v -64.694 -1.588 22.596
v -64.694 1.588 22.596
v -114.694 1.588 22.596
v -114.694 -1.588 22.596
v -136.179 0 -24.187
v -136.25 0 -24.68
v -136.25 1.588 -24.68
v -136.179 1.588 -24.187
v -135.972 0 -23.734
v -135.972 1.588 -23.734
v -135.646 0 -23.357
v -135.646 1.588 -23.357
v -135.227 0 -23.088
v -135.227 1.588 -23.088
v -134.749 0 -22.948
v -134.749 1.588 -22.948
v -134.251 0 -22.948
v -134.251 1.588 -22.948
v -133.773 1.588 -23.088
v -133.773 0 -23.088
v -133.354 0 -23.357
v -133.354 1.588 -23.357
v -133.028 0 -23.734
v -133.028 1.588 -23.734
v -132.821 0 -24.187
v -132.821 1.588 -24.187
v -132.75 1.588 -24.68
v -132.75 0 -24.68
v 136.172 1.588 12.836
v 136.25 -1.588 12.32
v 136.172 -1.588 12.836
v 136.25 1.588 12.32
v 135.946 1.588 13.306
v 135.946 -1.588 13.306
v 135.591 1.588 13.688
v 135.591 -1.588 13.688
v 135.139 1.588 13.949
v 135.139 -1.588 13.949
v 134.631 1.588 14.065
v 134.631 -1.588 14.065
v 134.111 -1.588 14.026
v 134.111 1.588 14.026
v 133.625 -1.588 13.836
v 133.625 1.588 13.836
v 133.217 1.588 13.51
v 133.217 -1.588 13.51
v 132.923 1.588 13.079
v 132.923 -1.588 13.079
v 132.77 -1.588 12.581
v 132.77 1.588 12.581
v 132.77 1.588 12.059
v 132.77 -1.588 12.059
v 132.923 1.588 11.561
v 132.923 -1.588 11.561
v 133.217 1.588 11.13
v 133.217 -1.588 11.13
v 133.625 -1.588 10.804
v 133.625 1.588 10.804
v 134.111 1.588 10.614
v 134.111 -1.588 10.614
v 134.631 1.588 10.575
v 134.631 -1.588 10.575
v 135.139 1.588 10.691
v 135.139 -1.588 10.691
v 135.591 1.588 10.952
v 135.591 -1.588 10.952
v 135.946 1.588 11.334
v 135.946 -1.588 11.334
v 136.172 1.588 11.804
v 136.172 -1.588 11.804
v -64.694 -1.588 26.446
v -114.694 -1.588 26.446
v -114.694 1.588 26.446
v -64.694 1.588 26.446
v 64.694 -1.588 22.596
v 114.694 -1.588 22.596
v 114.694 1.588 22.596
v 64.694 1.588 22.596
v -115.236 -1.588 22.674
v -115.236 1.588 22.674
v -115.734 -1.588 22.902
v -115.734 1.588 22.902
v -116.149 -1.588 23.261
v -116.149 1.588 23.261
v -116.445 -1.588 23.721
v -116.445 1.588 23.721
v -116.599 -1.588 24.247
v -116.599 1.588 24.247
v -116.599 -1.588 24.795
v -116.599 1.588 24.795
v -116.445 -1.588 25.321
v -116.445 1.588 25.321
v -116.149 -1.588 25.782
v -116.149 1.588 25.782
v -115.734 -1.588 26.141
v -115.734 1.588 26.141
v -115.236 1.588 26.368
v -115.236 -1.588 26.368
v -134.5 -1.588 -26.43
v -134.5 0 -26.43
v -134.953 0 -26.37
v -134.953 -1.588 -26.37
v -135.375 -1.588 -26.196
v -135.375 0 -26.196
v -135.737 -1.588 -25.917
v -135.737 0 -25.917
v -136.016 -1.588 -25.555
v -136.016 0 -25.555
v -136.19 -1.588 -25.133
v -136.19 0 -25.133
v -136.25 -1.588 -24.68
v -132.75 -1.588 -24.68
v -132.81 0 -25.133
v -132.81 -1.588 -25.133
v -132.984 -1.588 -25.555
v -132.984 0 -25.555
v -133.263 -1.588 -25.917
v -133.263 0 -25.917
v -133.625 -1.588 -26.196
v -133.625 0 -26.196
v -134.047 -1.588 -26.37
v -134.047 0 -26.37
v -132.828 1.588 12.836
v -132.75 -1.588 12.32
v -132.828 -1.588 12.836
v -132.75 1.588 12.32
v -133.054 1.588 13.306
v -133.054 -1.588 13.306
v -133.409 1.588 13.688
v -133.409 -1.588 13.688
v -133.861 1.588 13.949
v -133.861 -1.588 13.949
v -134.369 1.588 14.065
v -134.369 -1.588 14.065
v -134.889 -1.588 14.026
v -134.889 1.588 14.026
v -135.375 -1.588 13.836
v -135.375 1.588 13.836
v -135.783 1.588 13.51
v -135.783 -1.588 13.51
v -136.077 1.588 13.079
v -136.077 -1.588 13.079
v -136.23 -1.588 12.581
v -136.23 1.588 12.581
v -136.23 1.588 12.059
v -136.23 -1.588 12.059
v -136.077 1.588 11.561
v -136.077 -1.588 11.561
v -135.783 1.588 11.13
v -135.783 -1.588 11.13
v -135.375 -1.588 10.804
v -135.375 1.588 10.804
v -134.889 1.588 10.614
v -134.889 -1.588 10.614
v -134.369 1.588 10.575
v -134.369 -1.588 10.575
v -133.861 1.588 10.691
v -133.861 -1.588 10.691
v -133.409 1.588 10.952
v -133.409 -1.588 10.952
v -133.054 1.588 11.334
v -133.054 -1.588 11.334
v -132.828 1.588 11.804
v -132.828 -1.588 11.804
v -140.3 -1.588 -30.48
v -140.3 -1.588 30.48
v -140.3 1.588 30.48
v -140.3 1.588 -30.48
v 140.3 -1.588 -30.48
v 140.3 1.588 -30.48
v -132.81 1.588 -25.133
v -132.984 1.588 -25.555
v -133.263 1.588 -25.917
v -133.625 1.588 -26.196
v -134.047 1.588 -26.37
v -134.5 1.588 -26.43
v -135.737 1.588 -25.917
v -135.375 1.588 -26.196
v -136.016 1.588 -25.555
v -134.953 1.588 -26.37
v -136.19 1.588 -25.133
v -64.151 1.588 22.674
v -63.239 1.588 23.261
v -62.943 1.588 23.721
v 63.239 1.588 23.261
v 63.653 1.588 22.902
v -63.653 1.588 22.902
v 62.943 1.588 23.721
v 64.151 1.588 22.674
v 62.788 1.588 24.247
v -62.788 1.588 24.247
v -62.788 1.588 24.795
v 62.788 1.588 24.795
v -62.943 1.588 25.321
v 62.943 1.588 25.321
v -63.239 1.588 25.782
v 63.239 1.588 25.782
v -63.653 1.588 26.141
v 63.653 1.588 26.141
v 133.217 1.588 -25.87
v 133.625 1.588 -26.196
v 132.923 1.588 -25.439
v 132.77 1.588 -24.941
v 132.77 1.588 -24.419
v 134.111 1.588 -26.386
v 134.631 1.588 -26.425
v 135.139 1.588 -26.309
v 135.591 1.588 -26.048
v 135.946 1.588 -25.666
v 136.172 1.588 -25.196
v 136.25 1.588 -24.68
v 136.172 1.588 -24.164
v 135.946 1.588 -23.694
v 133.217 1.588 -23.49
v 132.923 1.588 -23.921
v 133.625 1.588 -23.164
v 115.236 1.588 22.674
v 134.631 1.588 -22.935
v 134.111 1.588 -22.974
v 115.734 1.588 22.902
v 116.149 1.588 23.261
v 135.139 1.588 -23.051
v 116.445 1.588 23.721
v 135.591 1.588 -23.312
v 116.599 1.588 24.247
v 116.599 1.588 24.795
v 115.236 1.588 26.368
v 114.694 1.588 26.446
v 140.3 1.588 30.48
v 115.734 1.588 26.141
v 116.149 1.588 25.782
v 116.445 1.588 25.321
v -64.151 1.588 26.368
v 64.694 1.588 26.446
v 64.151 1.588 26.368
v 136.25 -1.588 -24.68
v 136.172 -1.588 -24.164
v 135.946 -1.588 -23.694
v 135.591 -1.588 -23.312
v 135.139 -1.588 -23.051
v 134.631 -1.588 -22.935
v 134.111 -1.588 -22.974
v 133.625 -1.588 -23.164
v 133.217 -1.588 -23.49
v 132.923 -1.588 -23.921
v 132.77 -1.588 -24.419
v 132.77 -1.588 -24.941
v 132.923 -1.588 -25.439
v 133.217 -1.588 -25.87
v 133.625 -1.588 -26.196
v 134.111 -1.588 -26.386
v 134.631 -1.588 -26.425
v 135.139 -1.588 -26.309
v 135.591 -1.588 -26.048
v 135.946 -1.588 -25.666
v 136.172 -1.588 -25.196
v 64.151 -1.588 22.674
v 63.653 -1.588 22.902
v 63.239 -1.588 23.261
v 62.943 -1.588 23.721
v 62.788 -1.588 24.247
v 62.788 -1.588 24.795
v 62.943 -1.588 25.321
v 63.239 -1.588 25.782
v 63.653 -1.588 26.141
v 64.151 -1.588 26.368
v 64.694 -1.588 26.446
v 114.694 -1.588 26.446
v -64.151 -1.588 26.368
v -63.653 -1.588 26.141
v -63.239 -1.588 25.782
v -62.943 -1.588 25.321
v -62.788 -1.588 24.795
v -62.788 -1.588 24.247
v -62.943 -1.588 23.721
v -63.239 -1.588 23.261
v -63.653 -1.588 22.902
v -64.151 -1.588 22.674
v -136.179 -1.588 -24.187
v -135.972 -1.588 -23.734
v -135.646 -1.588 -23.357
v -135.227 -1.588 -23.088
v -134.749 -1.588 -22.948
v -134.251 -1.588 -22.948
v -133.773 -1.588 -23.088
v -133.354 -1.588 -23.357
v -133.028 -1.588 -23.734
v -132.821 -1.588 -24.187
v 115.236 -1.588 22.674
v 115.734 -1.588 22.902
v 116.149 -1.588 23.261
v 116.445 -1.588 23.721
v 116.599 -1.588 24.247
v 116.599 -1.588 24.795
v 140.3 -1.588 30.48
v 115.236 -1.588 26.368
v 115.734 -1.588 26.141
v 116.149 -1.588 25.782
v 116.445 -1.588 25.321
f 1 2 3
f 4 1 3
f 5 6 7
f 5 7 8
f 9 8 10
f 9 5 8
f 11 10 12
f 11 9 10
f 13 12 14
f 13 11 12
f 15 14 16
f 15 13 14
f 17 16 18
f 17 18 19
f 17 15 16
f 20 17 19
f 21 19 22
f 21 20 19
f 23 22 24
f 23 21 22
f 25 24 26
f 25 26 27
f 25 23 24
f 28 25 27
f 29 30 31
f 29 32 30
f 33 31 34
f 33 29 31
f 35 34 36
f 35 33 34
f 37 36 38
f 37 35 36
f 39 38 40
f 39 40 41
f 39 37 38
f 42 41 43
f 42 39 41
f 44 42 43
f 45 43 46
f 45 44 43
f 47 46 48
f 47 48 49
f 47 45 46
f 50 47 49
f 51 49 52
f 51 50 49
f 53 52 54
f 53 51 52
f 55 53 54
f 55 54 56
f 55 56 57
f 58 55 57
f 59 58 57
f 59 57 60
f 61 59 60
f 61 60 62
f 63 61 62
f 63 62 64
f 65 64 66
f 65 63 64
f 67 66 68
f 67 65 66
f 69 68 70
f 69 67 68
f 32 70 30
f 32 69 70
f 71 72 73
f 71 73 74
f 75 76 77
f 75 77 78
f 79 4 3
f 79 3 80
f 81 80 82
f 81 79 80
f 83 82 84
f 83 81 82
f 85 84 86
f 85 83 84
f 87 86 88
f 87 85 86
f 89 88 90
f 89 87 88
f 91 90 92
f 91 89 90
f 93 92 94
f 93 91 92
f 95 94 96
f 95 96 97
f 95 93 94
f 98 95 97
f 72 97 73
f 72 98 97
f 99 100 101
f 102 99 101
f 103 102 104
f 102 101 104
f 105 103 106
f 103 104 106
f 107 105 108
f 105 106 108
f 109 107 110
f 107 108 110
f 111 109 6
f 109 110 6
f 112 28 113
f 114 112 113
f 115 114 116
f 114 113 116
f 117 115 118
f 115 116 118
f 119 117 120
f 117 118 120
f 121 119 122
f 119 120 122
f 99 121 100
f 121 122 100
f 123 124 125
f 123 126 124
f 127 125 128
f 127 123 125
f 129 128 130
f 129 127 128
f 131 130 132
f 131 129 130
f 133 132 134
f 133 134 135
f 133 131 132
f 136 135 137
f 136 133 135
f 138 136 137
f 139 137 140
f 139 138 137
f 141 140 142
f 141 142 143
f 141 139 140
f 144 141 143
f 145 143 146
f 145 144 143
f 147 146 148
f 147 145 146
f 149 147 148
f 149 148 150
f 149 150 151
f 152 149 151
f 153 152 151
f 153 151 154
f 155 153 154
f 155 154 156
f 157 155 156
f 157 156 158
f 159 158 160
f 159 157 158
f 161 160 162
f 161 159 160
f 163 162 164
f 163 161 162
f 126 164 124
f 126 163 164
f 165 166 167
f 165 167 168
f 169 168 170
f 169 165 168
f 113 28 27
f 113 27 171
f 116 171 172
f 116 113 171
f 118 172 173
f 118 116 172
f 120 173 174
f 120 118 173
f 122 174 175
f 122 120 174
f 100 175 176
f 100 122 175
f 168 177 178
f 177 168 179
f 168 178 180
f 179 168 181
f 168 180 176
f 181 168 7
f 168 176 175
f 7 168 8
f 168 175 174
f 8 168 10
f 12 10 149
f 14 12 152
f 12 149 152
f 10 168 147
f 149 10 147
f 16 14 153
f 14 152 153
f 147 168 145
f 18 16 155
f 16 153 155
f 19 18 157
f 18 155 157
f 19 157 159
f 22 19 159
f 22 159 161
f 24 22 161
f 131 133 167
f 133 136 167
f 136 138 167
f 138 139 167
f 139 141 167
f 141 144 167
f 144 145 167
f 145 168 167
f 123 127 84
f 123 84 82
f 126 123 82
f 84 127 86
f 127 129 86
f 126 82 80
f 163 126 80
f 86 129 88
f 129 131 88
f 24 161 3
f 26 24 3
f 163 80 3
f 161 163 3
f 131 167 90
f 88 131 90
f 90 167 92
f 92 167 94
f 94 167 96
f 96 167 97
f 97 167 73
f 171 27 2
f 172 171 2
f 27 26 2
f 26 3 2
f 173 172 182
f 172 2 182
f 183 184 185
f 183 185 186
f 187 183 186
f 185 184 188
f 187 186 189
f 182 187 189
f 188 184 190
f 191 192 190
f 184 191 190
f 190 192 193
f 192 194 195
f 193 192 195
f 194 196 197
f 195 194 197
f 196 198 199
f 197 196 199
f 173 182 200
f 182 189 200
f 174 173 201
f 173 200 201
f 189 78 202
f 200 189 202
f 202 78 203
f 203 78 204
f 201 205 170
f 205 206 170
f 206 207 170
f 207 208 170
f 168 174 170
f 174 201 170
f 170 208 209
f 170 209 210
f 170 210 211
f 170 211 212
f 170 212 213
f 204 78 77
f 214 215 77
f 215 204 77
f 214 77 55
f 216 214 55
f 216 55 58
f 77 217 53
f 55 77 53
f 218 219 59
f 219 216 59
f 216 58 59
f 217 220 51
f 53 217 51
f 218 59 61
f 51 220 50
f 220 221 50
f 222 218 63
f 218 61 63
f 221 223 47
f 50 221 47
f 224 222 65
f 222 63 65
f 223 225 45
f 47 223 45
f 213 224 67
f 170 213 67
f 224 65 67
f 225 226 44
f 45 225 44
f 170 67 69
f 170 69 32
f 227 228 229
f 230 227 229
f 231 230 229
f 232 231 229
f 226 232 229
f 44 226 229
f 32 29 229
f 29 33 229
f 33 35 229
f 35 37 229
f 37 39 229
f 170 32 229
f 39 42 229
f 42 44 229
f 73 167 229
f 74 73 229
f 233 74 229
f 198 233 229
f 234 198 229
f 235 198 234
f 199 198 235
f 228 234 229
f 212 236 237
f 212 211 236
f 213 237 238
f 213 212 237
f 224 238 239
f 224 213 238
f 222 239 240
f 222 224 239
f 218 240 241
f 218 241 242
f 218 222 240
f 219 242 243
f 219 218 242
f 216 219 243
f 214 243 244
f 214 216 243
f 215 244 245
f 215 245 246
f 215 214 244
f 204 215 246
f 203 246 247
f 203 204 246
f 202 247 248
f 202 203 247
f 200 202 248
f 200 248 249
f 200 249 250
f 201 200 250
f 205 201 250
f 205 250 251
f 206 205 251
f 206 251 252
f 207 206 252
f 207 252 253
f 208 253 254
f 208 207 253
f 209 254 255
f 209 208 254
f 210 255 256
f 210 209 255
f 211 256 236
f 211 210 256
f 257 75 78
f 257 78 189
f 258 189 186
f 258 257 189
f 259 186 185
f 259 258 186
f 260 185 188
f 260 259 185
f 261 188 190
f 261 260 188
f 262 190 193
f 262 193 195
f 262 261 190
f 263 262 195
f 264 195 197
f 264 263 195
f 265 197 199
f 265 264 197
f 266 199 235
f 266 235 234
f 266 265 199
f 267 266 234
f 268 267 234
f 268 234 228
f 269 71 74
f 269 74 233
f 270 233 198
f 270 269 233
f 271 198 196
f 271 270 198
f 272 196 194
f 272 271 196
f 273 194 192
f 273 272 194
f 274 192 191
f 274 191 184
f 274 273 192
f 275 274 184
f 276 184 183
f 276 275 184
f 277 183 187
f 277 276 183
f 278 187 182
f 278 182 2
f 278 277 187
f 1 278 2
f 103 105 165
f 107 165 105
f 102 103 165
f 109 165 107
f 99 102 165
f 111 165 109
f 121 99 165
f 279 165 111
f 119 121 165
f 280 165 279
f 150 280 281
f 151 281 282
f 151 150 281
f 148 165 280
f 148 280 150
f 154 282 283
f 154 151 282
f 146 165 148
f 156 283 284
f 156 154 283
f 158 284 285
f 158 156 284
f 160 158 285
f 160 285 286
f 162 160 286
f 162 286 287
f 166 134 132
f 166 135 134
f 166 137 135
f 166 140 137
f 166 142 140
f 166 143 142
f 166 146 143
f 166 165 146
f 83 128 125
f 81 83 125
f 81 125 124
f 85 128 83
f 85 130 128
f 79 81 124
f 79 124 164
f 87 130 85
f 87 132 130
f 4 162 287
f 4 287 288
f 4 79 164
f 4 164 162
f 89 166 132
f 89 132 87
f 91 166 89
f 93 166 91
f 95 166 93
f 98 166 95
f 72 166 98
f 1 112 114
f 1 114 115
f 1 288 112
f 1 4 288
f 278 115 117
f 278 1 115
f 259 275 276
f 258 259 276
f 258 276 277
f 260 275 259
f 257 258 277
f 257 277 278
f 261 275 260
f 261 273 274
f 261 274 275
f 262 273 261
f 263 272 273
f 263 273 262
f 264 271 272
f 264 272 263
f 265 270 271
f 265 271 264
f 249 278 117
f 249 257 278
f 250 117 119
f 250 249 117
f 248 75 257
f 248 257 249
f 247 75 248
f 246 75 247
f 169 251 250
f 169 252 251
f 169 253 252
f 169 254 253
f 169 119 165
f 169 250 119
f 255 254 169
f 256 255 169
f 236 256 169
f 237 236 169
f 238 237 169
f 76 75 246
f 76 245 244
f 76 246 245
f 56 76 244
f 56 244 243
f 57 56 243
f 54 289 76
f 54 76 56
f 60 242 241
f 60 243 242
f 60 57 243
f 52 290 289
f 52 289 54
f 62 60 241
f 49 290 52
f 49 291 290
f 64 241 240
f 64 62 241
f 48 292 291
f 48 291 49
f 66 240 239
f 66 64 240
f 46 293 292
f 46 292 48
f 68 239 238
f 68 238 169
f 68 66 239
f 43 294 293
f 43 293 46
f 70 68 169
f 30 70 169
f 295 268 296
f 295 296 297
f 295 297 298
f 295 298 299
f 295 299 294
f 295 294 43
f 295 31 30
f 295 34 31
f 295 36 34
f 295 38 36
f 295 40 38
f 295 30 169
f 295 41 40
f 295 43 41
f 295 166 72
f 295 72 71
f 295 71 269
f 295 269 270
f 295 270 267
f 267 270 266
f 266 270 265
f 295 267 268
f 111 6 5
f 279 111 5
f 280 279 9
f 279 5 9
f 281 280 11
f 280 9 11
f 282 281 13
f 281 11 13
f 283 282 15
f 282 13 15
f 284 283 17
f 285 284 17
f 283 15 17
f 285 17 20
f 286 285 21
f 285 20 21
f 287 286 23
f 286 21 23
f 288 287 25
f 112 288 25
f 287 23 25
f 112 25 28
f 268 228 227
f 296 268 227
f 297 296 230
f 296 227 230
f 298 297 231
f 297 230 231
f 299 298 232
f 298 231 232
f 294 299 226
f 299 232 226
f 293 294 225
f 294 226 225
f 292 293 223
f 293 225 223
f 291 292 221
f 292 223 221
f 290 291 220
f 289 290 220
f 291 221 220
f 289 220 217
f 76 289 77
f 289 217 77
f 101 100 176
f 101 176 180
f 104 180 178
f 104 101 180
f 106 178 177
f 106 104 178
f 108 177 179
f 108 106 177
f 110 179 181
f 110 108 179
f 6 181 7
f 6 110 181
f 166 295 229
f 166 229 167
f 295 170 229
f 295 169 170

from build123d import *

# Parameters (mm, degrees)
F0_R     = 1.75
F1_DEPTH = 1.5875


with BuildPart() as f1:
    # F0 (on Front) → F1 (new body, symmetric)
    with BuildSketch(Plane.XZ):
        with BuildLine():
            Line((140.3, -30.48), (140.3, 30.48))
            Line((140.3, 30.48), (-140.3, 30.48))
            Line((-140.3, 30.48), (-140.3, -24.68))
            Line((-140.3, -24.68), (-136.25, -24.68))
            ThreePointArc((-136.25, -24.68), (-134.5, -22.93), (-132.75, -24.68))
            ThreePointArc((-132.75, -24.68), (-133.2625631329, -25.9174368671), (-134.5, -26.43))
            Line((-134.5, -26.43), (-134.5, -30.48))
            Line((-134.5, -30.48), (140.3, -30.48))
        make_face()
        with Locations((134.5, -24.68)):
            Circle(F0_R, mode=Mode.SUBTRACT)
        with Locations((-134.5, 12.32)):
            Circle(F0_R, mode=Mode.SUBTRACT)
        with BuildLine():
            Line((-114.69375, 26.44616), (-89.69375, 26.44616))
            Line((-89.69375, 26.44616), (-64.69375, 26.44616))
            ThreePointArc((-64.69375, 26.44616), (-62.76875, 24.52116), (-64.69375, 22.59616))
            Line((-64.69375, 22.59616), (-89.69375, 22.59616))
            Line((-89.69375, 22.59616), (-114.69375, 22.59616))
            ThreePointArc((-114.69375, 22.59616), (-116.61875, 24.52116), (-114.69375, 26.44616))
        make_face(mode=Mode.SUBTRACT)
        with Locations((134.5, 12.32)):
            Circle(F0_R, mode=Mode.SUBTRACT)
        with BuildLine():
            ThreePointArc((64.69375, 22.59616), (62.76875, 24.52116), (64.69375, 26.44616))
            Line((64.69375, 26.44616), (114.69375, 26.44616))
            ThreePointArc((114.69375, 26.44616), (116.61875, 24.52116), (114.69375, 22.59616))
            Line((114.69375, 22.59616), (64.69375, 22.59616))
        make_face(mode=Mode.SUBTRACT)
        with BuildLine():
            Line((-136.25, -24.68), (-140.3, -24.68))
            Line((-140.3, -24.68), (-140.3, -30.48))
            Line((-140.3, -30.48), (-134.5, -30.48))
            Line((-134.5, -30.48), (-134.5, -26.43))
            ThreePointArc((-134.5, -26.43), (-135.7374368671, -25.9174368671), (-136.25, -24.68))
        make_face()
    extrude(amount=F1_DEPTH, both=True)


solid = f1.part
